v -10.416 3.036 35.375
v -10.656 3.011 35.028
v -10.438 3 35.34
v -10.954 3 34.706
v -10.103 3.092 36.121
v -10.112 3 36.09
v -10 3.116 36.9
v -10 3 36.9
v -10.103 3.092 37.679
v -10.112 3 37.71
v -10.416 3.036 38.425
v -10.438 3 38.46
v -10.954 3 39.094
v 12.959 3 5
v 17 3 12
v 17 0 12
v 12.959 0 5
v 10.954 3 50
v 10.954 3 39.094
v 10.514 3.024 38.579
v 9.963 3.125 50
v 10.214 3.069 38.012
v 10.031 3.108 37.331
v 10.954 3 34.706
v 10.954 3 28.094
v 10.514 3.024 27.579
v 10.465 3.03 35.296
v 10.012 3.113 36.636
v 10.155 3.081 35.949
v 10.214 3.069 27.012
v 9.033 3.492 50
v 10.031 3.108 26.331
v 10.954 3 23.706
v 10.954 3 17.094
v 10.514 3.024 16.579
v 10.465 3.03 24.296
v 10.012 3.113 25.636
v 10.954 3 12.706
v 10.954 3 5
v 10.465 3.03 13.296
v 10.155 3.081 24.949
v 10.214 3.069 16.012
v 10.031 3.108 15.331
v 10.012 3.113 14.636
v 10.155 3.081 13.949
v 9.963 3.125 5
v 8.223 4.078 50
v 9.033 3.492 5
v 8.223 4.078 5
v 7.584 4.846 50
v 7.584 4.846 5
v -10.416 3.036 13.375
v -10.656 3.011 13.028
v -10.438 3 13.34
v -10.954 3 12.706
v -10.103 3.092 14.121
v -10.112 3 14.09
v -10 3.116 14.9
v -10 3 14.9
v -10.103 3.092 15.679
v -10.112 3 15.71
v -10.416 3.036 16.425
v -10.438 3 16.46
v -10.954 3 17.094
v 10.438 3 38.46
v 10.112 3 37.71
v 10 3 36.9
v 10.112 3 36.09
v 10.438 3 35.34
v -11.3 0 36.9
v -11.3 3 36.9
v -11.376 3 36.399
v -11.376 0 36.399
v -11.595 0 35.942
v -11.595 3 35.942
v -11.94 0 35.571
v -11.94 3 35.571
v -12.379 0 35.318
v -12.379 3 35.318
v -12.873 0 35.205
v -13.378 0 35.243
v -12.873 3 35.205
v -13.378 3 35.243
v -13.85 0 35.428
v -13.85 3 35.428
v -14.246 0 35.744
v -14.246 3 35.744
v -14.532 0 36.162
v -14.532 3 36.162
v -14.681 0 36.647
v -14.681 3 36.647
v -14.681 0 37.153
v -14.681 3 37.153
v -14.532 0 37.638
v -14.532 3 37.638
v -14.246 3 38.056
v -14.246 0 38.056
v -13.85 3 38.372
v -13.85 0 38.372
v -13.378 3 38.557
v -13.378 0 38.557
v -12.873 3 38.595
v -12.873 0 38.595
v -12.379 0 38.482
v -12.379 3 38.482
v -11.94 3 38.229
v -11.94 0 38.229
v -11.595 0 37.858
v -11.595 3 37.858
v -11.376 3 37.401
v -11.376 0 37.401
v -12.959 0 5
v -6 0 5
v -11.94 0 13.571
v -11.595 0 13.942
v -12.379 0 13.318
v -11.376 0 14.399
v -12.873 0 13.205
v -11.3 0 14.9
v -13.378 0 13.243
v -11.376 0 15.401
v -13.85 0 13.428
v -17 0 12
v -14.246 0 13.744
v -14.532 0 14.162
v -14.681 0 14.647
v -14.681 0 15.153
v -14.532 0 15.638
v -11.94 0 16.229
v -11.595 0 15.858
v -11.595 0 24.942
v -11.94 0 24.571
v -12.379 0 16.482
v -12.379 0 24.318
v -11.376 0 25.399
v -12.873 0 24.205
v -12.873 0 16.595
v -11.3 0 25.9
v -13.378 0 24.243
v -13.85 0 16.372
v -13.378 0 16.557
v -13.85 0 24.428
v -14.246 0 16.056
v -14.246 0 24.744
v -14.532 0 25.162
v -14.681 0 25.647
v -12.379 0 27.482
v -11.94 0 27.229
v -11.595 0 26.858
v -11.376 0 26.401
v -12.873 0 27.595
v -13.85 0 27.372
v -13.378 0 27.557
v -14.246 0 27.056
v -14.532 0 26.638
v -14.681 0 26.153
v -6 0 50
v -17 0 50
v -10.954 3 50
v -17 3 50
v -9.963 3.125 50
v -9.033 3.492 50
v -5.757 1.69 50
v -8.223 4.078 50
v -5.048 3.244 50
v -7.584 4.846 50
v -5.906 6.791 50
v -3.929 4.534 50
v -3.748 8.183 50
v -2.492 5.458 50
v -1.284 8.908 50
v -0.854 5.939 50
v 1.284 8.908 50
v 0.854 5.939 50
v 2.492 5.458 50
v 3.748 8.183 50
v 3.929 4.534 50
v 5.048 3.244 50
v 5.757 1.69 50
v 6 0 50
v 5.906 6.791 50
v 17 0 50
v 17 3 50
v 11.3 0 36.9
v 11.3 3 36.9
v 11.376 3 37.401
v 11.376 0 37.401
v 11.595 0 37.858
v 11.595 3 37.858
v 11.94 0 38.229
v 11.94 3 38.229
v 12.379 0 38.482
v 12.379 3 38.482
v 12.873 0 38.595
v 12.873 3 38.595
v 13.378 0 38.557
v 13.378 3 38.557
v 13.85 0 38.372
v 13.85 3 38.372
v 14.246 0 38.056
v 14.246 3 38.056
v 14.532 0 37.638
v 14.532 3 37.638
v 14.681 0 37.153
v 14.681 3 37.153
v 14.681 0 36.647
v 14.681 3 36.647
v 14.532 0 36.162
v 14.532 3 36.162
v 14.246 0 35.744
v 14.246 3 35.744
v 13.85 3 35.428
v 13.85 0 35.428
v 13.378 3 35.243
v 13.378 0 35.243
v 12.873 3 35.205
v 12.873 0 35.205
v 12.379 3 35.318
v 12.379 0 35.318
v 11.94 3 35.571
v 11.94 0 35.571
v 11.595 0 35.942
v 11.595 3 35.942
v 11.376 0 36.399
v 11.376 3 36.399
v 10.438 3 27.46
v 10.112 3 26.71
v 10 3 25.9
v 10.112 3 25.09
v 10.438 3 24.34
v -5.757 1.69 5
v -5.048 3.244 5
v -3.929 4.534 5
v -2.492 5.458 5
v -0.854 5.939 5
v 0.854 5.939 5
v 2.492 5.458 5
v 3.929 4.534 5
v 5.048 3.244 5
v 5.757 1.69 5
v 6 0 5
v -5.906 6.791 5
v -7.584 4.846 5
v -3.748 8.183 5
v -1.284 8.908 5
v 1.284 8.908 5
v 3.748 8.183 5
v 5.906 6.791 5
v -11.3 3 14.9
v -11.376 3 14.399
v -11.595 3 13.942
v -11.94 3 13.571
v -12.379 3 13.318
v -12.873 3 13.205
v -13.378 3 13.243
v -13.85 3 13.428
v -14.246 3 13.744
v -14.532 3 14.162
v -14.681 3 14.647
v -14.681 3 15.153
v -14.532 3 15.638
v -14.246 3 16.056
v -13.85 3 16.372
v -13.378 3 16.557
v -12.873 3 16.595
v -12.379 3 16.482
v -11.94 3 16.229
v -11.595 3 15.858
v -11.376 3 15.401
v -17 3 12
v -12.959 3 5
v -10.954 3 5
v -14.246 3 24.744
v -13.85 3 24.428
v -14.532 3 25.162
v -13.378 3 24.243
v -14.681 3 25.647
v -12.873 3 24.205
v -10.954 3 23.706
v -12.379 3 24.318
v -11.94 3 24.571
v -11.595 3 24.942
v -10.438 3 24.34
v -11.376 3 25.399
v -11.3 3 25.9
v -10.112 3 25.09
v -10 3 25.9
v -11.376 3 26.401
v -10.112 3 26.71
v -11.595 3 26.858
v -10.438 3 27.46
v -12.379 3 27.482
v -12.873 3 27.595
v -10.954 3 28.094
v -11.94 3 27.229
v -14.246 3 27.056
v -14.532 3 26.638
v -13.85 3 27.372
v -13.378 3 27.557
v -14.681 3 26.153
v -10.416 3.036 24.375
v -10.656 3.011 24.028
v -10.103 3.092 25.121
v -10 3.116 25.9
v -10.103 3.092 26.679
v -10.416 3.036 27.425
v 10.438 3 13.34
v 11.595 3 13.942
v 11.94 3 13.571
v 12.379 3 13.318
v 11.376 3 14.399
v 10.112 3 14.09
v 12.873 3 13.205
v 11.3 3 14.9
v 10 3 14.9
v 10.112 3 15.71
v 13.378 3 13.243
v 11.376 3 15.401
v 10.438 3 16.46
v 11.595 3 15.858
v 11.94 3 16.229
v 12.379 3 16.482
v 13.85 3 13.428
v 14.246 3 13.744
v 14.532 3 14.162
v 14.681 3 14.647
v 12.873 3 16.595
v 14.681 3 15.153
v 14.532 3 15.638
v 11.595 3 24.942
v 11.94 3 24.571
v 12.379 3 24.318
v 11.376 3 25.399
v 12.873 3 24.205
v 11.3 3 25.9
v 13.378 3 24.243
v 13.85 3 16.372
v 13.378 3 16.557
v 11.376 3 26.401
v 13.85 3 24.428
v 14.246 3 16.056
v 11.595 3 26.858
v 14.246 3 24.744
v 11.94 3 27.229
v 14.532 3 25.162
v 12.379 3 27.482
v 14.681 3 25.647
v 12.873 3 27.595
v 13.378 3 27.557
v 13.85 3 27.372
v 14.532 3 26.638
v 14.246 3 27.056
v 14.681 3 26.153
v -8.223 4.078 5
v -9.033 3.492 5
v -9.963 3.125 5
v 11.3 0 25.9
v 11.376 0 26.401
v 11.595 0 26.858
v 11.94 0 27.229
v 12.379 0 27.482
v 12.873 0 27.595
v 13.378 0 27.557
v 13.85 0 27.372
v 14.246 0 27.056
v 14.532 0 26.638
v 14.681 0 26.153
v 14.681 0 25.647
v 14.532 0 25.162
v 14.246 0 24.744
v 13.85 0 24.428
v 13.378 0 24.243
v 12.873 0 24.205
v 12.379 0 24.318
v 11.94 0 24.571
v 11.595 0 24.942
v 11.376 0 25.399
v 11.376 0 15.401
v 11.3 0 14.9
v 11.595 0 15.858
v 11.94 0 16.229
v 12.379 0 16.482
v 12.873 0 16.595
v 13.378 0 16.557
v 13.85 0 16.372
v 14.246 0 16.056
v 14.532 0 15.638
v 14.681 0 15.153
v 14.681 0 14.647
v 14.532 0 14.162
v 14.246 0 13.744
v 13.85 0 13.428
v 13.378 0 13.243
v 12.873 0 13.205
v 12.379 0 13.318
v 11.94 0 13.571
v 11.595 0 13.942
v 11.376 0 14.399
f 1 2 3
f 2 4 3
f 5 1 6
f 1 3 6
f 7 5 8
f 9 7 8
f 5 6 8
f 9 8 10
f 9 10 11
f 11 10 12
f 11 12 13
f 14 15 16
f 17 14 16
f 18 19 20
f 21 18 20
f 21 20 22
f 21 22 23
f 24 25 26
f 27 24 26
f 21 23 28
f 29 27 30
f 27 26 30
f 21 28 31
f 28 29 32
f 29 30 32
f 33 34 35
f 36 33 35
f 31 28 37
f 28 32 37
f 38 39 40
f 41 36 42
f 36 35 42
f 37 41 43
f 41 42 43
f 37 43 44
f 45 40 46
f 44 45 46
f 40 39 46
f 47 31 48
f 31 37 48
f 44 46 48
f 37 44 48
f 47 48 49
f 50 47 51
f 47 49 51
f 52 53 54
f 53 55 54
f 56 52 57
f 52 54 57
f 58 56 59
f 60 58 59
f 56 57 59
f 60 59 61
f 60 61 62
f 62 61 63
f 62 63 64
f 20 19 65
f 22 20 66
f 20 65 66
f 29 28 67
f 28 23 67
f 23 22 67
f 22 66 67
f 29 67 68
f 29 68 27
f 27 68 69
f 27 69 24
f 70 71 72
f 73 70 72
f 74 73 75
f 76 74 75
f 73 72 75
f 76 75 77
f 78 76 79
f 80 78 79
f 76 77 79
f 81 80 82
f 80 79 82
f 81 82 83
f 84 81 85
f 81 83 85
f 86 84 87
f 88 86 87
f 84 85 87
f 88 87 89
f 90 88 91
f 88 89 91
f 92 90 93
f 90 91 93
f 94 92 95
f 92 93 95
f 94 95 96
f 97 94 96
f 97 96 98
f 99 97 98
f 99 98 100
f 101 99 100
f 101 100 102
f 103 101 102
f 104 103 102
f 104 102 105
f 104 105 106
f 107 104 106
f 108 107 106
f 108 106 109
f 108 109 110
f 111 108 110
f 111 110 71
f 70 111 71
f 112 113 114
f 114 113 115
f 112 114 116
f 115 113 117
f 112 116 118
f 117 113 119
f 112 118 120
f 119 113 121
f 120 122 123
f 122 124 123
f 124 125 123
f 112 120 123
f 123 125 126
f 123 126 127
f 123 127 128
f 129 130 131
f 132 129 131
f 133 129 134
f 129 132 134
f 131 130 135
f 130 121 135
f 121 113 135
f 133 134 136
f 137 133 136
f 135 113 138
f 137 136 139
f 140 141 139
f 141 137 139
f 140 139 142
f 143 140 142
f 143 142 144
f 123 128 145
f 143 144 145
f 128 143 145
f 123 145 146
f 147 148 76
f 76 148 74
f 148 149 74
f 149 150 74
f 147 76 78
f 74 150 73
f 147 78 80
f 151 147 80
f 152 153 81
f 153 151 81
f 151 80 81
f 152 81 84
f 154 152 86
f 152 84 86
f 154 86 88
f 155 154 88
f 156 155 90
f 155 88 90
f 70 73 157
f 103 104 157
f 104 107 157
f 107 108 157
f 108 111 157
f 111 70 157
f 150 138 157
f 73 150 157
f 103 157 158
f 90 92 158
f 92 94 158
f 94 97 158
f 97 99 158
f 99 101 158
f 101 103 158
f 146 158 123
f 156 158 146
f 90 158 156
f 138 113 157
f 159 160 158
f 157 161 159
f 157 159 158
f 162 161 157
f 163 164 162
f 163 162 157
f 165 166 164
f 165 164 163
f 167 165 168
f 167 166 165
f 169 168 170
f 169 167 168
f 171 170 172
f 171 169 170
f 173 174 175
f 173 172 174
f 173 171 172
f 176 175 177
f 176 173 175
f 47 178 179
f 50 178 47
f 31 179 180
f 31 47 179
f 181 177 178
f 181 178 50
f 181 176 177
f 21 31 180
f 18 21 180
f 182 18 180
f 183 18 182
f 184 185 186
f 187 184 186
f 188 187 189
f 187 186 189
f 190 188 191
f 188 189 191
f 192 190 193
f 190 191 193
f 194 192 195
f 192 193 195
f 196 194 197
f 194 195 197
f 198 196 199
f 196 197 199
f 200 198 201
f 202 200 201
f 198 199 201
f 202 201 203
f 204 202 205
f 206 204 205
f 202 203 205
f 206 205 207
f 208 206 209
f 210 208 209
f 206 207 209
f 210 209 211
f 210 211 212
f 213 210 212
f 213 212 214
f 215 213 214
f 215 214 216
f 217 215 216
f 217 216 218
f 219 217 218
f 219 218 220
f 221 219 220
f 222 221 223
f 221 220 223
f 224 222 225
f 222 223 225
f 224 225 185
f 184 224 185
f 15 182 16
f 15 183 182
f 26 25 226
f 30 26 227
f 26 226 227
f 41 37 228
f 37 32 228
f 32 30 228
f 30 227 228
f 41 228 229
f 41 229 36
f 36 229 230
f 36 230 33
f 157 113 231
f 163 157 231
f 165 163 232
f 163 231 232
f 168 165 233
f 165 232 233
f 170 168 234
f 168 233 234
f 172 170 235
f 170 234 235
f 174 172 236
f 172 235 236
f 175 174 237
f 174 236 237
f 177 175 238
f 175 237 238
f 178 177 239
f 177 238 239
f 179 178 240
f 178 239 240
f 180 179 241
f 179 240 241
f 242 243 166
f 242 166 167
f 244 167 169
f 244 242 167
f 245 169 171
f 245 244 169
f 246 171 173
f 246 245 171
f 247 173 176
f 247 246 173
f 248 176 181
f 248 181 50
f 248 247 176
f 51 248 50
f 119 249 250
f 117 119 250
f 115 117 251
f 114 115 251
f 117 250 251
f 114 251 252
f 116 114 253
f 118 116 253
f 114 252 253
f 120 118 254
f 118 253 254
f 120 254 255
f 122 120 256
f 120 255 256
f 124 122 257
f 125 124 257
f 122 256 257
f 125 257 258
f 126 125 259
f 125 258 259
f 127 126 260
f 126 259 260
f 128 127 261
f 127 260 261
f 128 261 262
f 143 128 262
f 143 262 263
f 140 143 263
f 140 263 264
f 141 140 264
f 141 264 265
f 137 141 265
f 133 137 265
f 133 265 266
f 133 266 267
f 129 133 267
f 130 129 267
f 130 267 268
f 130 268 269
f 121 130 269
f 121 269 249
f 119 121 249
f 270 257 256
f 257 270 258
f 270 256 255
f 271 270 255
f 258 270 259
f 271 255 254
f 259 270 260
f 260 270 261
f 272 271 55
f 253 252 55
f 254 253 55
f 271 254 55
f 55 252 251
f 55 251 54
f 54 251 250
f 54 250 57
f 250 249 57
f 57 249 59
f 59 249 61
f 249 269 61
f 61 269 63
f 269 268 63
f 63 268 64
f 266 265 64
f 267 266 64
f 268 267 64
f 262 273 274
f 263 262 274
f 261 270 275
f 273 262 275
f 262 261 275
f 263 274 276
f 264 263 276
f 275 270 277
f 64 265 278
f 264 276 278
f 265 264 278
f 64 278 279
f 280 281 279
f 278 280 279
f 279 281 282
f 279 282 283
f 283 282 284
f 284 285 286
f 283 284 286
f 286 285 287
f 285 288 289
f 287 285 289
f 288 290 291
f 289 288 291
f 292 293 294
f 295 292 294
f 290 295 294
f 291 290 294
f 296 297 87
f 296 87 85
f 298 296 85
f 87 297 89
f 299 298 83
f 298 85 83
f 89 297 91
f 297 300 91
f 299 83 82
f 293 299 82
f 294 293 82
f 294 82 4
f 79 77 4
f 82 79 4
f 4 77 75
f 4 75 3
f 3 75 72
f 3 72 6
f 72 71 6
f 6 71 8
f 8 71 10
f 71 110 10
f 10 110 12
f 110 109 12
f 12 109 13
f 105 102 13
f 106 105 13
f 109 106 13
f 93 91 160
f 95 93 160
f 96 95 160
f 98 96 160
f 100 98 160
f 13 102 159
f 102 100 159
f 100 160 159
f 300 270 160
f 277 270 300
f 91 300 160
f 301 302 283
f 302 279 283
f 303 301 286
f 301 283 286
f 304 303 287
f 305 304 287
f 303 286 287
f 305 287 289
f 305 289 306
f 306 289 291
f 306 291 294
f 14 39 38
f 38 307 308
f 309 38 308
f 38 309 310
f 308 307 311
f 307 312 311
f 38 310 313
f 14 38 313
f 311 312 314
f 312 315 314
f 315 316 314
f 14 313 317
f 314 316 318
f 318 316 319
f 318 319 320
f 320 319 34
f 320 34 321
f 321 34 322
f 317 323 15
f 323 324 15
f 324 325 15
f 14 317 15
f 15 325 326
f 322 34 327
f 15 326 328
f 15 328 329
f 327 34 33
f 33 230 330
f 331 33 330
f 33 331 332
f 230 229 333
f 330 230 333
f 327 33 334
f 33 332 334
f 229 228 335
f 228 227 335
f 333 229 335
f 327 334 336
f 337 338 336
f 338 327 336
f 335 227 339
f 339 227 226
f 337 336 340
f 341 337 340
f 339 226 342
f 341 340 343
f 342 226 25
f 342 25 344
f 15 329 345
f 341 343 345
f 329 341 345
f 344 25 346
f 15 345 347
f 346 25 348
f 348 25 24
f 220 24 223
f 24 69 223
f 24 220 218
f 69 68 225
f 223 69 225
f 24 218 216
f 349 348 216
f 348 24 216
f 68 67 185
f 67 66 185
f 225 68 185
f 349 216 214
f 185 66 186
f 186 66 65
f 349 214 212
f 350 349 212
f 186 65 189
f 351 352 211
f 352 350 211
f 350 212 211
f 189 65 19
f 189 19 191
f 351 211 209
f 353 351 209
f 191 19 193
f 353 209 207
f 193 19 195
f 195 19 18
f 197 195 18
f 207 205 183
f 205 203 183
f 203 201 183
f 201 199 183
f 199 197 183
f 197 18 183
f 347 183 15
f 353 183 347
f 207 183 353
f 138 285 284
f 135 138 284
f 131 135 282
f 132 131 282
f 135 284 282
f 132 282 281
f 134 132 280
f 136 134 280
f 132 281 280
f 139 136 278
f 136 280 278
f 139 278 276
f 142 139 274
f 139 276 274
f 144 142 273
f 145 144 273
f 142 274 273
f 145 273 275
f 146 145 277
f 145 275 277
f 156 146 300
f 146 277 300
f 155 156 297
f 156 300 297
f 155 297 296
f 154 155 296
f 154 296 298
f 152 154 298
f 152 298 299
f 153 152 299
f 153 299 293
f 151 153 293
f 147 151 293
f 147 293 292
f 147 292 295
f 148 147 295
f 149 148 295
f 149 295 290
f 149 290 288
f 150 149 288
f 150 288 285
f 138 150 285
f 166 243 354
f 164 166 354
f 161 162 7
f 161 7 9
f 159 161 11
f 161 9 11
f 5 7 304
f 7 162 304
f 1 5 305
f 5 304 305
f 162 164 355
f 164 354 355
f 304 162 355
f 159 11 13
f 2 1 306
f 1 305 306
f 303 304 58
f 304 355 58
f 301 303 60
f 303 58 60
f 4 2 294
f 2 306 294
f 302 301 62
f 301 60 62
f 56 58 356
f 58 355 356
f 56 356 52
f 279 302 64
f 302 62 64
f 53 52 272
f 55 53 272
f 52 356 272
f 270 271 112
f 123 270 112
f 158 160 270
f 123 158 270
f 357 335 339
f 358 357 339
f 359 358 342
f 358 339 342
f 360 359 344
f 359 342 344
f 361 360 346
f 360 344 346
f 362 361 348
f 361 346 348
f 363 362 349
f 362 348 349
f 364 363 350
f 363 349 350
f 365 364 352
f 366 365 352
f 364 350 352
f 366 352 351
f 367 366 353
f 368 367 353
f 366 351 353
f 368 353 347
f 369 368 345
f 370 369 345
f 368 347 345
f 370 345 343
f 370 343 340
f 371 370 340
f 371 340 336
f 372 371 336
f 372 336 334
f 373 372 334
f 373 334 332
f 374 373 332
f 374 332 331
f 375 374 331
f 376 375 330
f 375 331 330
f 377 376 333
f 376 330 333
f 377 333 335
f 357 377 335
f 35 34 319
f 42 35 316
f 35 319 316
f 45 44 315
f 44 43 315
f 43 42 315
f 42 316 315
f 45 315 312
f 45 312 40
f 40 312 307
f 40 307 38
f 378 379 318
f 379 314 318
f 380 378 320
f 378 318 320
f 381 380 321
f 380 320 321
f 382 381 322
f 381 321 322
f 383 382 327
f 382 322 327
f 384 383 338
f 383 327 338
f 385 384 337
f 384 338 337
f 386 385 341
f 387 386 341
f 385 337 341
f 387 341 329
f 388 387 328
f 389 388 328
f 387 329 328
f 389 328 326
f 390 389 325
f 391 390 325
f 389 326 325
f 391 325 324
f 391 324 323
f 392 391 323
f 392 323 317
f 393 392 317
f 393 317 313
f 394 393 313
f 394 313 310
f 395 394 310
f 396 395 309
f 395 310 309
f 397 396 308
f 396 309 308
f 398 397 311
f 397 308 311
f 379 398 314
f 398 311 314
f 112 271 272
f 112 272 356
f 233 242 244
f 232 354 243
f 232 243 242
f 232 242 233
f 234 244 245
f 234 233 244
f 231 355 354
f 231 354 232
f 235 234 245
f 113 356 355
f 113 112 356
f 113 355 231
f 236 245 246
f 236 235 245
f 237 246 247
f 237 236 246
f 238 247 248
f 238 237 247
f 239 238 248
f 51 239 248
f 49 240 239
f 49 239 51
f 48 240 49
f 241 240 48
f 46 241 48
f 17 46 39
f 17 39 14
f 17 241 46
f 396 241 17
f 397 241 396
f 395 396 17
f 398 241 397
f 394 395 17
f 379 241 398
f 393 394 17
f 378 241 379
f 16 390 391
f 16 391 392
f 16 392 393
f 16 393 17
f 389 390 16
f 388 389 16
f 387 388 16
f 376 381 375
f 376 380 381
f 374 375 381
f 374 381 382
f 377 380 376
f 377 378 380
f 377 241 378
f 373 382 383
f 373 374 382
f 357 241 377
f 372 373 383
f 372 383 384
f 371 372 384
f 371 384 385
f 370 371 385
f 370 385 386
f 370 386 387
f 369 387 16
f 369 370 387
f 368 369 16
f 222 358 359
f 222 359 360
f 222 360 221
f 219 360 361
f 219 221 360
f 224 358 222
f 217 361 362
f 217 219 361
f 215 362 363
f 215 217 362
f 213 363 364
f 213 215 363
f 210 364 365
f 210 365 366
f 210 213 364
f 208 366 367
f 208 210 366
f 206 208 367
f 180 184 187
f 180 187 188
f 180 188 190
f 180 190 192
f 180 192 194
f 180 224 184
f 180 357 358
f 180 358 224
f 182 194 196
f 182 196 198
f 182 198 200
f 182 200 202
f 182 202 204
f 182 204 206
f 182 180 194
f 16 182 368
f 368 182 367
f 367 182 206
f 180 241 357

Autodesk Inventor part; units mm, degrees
ref_plane "YZ Plane" through (0, 0, 0) normal (1, 0, 0) x (0, 1, 0)
ref_plane "XZ Plane" through (0, 0, 0) normal (0, 1, 0) x (-1, 0, 0)
sketch "Szkic1" plane through (0, 0, 0) normal (0, 0, 1) x (1, 0, 0)
  circle A0 centre (0, 0) radius 6
  circle A1 centre (0, 0) radius 9
  dimension "d0" = 12
  dimension "d1" = 18
extrude "Wyciągnięcie proste1" add sketch "Szkic1" along normal blind 50
sketch "Szkic2" plane through (0, 0, 50) normal (0, 0, 1) x (1, 0, 0)
  line L0 (-7.2, 0) -> (-20, 0)
  line L1 (-20, 0) -> (-20, 3)
  line L2 (-20, 3) -> (-7.2, 3)
  line L3 (-7.2, 3) -> (-7.2, 0)
  point P0 (0, 0)
  dimension "d4" = 3
  dimension "d5" = 7.2
  dimension "d6" = 20
extrude "Wyciągnięcie proste2" add sketch "Szkic2" against normal blind 50
ref_plane "Płaszczyzna konstrukcyjna1" through (0, 0, 50) normal (-1, 0, 0) x (0, 0, 1)
sketch "Szkic3" plane through (0, 0, 50) normal (0, 0, 1) x (1, 0, 0)
  arc A0 (-9, 0) -> (-8.4853, 3) centre (0, 0) ccw projected
  line L0 (-9, 0) -> (13.5216, 0)
  line L1 (13.5216, 0) -> (13.5216, -10.7801)
  line L2 (13.5216, -10.7801) -> (-9, -10.7801)
  line L3 (-9, -10.7801) -> (-9, 0)
extrude "Wyciągnięcie proste3" cut sketch "Szkic3" against normal blind 50
sketch "Szkic5" plane through (-20, 3, 50) normal (0, 1, 0) x (1, 0, 0)
  circle A0 centre (7, 13.1) radius 1.7
  circle A1 centre (7, 24.1) radius 1.7
  circle A2 centre (7, 35.1) radius 1.7
  line L0 (0, 0) -> (11.5147, 0) projected
  line L1 (20, -10) -> (20, 60) projected
  point P0 (20, 50)
  dimension "d12" = 3.4
  dimension "d13" = 3.4
  dimension "d14" = 3.4
  dimension "d16" = 13.1
  dimension "d17" = 11
  dimension "d18" = 11
  dimension "d19" = 13
  dimension "d20" = 0
  dimension "d21" = 0
extrude "Wyciągnięcie proste4" cut sketch "Szkic5" against normal blind 50
fillet "Zaokrąglenie1" radius 4 1 edges at (-8.4853, 3, 25)
mirror "Odbij1" about plane through (0, 0, 50) normal (-1, 0, 0) of "Wyciągnięcie proste2", "Wyciągnięcie proste4", "Zaokrąglenie1"
sketch "Szkic6" plane through (6, 0, 0) normal (0, -1, 0) x (1, 0, 0)
  line L0 (15.0838, 0) -> (-24.5144, 0)
  line L1 (-24.5144, 0) -> (-24.5144, 5)
  line L2 (-24.5144, 5) -> (15.0838, 5)
  line L3 (15.0838, 5) -> (15.0838, 0)
  point P0 (-6, 0)
  dimension "d28" = 5
extrude "Wyciągnięcie proste5" cut sketch "Szkic6" against normal blind 50
sketch "Szkic8" plane through (-20, 3, 50) normal (0, 1, 0) x (1, 0, 0)
  line L0 (-3.2921, -2.8939) -> (3, -2.8939)
  line L1 (3, -2.8939) -> (3, 49.96)
  line L2 (3, 49.96) -> (-3.2921, 49.96)
  line L3 (-3.2921, 49.96) -> (-3.2921, -2.8939)
  line L4 (37, 48) -> (48.6867, 48)
  line L5 (48.6867, 48) -> (48.6867, -7.6985)
  line L6 (48.6867, -7.6985) -> (37, -7.6985)
  line L7 (37, -7.6985) -> (37, 48)
  circle A0 centre (33, 35.1) radius 1.7 projected
  circle A1 centre (7, 35.1) radius 1.7 projected
  point P0 (20, 50)
  dimension "d32" = 4
  dimension "d33" = 4
extrude "Wyciągnięcie proste6" cut sketch "Szkic8" against normal blind 50 contours L3 L2 L1 L0 | L4 L5 L6 L7
chamfer "Faza2" distance 7 angle 30 1 edges at (17, 1.5, 5) measured on face at (17, 1, 35)
chamfer "Faza3" distance 7 angle 30 1 edges at (-17, 1.5, 5) measured on face at (-17, 1, 35)
sketch "Szkic9" plane through (-20, 3, 0.04) normal (0, 0, 1) x (1, 0, 0)
  line L0 (-2.5115, 2.374) -> (2.3445, 2.374)
  line L1 (2.3445, 2.374) -> (2.3445, -9.0767)
  line L2 (2.3445, -9.0767) -> (-2.5115, -9.0767)
  line L3 (-2.5115, -9.0767) -> (-2.5115, 2.374)
  point P0 (20, -3)
extrude "Wyciągnięcie proste7" cut sketch "Szkic9" against normal blind 50
sketch "Szkic11" plane through (-10.9545, 3, 50) normal (0, 1, 0) x (1, 0, 0)
  circle A0 centre (-2.0455, 35.1) radius 3
  circle A1 centre (-2.0455, 13.1) radius 3
  circle A2 centre (-2.0455, 24.1) radius 3
  circle A3 centre (23.9545, 35.1) radius 3
  circle A4 centre (23.9545, 24.1) radius 3
  circle A5 centre (23.9545, 13.1) radius 3
  circle A6 centre (23.9545, 35.1) radius 1.7 projected
  circle A7 centre (23.9545, 24.1) radius 1.7 projected
  circle A8 centre (23.9545, 13.1) radius 1.7 projected
  circle A9 centre (-2.0455, 13.1) radius 1.7 projected
  circle A10 centre (-2.0455, 24.1) radius 1.7 projected
  circle A11 centre (-2.0455, 35.1) radius 1.7 projected
  point P0 (10.9545, 50)
  dimension "d47" = 6
  dimension "d48" = 6
  dimension "d49" = 6
  dimension "d50" = 6
  dimension "d51" = 6
  dimension "d52" = 6
extrude "Wyciągnięcie proste9" cut sketch "Szkic11" along normal blind 50
properties part number "Cartesian1_X_RodCover" material "Tworzywo sztuczne ABS"
